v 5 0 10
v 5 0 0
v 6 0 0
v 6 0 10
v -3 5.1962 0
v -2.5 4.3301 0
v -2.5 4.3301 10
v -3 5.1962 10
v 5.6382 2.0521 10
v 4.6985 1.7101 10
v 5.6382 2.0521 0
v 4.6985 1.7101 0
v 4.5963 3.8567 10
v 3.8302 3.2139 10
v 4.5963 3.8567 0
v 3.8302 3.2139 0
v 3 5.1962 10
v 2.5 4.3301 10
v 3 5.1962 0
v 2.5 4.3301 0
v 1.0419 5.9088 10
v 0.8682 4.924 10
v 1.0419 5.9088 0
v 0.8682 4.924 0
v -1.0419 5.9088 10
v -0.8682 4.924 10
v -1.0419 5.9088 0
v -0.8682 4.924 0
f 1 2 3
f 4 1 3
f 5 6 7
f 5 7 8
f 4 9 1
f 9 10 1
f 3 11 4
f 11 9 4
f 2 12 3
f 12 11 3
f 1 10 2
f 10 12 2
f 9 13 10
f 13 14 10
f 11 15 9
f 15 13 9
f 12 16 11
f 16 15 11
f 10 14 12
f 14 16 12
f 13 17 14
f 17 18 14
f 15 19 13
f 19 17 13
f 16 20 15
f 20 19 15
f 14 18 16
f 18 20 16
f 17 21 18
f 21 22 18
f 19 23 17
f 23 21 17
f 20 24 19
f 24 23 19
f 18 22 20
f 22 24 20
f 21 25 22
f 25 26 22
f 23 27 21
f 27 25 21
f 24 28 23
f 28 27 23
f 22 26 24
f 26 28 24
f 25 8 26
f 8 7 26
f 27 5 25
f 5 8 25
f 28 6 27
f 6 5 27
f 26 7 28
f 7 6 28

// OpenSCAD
rotate_extrude(angle = 180-60)
translate([5, 0])
square([1, 10]);
